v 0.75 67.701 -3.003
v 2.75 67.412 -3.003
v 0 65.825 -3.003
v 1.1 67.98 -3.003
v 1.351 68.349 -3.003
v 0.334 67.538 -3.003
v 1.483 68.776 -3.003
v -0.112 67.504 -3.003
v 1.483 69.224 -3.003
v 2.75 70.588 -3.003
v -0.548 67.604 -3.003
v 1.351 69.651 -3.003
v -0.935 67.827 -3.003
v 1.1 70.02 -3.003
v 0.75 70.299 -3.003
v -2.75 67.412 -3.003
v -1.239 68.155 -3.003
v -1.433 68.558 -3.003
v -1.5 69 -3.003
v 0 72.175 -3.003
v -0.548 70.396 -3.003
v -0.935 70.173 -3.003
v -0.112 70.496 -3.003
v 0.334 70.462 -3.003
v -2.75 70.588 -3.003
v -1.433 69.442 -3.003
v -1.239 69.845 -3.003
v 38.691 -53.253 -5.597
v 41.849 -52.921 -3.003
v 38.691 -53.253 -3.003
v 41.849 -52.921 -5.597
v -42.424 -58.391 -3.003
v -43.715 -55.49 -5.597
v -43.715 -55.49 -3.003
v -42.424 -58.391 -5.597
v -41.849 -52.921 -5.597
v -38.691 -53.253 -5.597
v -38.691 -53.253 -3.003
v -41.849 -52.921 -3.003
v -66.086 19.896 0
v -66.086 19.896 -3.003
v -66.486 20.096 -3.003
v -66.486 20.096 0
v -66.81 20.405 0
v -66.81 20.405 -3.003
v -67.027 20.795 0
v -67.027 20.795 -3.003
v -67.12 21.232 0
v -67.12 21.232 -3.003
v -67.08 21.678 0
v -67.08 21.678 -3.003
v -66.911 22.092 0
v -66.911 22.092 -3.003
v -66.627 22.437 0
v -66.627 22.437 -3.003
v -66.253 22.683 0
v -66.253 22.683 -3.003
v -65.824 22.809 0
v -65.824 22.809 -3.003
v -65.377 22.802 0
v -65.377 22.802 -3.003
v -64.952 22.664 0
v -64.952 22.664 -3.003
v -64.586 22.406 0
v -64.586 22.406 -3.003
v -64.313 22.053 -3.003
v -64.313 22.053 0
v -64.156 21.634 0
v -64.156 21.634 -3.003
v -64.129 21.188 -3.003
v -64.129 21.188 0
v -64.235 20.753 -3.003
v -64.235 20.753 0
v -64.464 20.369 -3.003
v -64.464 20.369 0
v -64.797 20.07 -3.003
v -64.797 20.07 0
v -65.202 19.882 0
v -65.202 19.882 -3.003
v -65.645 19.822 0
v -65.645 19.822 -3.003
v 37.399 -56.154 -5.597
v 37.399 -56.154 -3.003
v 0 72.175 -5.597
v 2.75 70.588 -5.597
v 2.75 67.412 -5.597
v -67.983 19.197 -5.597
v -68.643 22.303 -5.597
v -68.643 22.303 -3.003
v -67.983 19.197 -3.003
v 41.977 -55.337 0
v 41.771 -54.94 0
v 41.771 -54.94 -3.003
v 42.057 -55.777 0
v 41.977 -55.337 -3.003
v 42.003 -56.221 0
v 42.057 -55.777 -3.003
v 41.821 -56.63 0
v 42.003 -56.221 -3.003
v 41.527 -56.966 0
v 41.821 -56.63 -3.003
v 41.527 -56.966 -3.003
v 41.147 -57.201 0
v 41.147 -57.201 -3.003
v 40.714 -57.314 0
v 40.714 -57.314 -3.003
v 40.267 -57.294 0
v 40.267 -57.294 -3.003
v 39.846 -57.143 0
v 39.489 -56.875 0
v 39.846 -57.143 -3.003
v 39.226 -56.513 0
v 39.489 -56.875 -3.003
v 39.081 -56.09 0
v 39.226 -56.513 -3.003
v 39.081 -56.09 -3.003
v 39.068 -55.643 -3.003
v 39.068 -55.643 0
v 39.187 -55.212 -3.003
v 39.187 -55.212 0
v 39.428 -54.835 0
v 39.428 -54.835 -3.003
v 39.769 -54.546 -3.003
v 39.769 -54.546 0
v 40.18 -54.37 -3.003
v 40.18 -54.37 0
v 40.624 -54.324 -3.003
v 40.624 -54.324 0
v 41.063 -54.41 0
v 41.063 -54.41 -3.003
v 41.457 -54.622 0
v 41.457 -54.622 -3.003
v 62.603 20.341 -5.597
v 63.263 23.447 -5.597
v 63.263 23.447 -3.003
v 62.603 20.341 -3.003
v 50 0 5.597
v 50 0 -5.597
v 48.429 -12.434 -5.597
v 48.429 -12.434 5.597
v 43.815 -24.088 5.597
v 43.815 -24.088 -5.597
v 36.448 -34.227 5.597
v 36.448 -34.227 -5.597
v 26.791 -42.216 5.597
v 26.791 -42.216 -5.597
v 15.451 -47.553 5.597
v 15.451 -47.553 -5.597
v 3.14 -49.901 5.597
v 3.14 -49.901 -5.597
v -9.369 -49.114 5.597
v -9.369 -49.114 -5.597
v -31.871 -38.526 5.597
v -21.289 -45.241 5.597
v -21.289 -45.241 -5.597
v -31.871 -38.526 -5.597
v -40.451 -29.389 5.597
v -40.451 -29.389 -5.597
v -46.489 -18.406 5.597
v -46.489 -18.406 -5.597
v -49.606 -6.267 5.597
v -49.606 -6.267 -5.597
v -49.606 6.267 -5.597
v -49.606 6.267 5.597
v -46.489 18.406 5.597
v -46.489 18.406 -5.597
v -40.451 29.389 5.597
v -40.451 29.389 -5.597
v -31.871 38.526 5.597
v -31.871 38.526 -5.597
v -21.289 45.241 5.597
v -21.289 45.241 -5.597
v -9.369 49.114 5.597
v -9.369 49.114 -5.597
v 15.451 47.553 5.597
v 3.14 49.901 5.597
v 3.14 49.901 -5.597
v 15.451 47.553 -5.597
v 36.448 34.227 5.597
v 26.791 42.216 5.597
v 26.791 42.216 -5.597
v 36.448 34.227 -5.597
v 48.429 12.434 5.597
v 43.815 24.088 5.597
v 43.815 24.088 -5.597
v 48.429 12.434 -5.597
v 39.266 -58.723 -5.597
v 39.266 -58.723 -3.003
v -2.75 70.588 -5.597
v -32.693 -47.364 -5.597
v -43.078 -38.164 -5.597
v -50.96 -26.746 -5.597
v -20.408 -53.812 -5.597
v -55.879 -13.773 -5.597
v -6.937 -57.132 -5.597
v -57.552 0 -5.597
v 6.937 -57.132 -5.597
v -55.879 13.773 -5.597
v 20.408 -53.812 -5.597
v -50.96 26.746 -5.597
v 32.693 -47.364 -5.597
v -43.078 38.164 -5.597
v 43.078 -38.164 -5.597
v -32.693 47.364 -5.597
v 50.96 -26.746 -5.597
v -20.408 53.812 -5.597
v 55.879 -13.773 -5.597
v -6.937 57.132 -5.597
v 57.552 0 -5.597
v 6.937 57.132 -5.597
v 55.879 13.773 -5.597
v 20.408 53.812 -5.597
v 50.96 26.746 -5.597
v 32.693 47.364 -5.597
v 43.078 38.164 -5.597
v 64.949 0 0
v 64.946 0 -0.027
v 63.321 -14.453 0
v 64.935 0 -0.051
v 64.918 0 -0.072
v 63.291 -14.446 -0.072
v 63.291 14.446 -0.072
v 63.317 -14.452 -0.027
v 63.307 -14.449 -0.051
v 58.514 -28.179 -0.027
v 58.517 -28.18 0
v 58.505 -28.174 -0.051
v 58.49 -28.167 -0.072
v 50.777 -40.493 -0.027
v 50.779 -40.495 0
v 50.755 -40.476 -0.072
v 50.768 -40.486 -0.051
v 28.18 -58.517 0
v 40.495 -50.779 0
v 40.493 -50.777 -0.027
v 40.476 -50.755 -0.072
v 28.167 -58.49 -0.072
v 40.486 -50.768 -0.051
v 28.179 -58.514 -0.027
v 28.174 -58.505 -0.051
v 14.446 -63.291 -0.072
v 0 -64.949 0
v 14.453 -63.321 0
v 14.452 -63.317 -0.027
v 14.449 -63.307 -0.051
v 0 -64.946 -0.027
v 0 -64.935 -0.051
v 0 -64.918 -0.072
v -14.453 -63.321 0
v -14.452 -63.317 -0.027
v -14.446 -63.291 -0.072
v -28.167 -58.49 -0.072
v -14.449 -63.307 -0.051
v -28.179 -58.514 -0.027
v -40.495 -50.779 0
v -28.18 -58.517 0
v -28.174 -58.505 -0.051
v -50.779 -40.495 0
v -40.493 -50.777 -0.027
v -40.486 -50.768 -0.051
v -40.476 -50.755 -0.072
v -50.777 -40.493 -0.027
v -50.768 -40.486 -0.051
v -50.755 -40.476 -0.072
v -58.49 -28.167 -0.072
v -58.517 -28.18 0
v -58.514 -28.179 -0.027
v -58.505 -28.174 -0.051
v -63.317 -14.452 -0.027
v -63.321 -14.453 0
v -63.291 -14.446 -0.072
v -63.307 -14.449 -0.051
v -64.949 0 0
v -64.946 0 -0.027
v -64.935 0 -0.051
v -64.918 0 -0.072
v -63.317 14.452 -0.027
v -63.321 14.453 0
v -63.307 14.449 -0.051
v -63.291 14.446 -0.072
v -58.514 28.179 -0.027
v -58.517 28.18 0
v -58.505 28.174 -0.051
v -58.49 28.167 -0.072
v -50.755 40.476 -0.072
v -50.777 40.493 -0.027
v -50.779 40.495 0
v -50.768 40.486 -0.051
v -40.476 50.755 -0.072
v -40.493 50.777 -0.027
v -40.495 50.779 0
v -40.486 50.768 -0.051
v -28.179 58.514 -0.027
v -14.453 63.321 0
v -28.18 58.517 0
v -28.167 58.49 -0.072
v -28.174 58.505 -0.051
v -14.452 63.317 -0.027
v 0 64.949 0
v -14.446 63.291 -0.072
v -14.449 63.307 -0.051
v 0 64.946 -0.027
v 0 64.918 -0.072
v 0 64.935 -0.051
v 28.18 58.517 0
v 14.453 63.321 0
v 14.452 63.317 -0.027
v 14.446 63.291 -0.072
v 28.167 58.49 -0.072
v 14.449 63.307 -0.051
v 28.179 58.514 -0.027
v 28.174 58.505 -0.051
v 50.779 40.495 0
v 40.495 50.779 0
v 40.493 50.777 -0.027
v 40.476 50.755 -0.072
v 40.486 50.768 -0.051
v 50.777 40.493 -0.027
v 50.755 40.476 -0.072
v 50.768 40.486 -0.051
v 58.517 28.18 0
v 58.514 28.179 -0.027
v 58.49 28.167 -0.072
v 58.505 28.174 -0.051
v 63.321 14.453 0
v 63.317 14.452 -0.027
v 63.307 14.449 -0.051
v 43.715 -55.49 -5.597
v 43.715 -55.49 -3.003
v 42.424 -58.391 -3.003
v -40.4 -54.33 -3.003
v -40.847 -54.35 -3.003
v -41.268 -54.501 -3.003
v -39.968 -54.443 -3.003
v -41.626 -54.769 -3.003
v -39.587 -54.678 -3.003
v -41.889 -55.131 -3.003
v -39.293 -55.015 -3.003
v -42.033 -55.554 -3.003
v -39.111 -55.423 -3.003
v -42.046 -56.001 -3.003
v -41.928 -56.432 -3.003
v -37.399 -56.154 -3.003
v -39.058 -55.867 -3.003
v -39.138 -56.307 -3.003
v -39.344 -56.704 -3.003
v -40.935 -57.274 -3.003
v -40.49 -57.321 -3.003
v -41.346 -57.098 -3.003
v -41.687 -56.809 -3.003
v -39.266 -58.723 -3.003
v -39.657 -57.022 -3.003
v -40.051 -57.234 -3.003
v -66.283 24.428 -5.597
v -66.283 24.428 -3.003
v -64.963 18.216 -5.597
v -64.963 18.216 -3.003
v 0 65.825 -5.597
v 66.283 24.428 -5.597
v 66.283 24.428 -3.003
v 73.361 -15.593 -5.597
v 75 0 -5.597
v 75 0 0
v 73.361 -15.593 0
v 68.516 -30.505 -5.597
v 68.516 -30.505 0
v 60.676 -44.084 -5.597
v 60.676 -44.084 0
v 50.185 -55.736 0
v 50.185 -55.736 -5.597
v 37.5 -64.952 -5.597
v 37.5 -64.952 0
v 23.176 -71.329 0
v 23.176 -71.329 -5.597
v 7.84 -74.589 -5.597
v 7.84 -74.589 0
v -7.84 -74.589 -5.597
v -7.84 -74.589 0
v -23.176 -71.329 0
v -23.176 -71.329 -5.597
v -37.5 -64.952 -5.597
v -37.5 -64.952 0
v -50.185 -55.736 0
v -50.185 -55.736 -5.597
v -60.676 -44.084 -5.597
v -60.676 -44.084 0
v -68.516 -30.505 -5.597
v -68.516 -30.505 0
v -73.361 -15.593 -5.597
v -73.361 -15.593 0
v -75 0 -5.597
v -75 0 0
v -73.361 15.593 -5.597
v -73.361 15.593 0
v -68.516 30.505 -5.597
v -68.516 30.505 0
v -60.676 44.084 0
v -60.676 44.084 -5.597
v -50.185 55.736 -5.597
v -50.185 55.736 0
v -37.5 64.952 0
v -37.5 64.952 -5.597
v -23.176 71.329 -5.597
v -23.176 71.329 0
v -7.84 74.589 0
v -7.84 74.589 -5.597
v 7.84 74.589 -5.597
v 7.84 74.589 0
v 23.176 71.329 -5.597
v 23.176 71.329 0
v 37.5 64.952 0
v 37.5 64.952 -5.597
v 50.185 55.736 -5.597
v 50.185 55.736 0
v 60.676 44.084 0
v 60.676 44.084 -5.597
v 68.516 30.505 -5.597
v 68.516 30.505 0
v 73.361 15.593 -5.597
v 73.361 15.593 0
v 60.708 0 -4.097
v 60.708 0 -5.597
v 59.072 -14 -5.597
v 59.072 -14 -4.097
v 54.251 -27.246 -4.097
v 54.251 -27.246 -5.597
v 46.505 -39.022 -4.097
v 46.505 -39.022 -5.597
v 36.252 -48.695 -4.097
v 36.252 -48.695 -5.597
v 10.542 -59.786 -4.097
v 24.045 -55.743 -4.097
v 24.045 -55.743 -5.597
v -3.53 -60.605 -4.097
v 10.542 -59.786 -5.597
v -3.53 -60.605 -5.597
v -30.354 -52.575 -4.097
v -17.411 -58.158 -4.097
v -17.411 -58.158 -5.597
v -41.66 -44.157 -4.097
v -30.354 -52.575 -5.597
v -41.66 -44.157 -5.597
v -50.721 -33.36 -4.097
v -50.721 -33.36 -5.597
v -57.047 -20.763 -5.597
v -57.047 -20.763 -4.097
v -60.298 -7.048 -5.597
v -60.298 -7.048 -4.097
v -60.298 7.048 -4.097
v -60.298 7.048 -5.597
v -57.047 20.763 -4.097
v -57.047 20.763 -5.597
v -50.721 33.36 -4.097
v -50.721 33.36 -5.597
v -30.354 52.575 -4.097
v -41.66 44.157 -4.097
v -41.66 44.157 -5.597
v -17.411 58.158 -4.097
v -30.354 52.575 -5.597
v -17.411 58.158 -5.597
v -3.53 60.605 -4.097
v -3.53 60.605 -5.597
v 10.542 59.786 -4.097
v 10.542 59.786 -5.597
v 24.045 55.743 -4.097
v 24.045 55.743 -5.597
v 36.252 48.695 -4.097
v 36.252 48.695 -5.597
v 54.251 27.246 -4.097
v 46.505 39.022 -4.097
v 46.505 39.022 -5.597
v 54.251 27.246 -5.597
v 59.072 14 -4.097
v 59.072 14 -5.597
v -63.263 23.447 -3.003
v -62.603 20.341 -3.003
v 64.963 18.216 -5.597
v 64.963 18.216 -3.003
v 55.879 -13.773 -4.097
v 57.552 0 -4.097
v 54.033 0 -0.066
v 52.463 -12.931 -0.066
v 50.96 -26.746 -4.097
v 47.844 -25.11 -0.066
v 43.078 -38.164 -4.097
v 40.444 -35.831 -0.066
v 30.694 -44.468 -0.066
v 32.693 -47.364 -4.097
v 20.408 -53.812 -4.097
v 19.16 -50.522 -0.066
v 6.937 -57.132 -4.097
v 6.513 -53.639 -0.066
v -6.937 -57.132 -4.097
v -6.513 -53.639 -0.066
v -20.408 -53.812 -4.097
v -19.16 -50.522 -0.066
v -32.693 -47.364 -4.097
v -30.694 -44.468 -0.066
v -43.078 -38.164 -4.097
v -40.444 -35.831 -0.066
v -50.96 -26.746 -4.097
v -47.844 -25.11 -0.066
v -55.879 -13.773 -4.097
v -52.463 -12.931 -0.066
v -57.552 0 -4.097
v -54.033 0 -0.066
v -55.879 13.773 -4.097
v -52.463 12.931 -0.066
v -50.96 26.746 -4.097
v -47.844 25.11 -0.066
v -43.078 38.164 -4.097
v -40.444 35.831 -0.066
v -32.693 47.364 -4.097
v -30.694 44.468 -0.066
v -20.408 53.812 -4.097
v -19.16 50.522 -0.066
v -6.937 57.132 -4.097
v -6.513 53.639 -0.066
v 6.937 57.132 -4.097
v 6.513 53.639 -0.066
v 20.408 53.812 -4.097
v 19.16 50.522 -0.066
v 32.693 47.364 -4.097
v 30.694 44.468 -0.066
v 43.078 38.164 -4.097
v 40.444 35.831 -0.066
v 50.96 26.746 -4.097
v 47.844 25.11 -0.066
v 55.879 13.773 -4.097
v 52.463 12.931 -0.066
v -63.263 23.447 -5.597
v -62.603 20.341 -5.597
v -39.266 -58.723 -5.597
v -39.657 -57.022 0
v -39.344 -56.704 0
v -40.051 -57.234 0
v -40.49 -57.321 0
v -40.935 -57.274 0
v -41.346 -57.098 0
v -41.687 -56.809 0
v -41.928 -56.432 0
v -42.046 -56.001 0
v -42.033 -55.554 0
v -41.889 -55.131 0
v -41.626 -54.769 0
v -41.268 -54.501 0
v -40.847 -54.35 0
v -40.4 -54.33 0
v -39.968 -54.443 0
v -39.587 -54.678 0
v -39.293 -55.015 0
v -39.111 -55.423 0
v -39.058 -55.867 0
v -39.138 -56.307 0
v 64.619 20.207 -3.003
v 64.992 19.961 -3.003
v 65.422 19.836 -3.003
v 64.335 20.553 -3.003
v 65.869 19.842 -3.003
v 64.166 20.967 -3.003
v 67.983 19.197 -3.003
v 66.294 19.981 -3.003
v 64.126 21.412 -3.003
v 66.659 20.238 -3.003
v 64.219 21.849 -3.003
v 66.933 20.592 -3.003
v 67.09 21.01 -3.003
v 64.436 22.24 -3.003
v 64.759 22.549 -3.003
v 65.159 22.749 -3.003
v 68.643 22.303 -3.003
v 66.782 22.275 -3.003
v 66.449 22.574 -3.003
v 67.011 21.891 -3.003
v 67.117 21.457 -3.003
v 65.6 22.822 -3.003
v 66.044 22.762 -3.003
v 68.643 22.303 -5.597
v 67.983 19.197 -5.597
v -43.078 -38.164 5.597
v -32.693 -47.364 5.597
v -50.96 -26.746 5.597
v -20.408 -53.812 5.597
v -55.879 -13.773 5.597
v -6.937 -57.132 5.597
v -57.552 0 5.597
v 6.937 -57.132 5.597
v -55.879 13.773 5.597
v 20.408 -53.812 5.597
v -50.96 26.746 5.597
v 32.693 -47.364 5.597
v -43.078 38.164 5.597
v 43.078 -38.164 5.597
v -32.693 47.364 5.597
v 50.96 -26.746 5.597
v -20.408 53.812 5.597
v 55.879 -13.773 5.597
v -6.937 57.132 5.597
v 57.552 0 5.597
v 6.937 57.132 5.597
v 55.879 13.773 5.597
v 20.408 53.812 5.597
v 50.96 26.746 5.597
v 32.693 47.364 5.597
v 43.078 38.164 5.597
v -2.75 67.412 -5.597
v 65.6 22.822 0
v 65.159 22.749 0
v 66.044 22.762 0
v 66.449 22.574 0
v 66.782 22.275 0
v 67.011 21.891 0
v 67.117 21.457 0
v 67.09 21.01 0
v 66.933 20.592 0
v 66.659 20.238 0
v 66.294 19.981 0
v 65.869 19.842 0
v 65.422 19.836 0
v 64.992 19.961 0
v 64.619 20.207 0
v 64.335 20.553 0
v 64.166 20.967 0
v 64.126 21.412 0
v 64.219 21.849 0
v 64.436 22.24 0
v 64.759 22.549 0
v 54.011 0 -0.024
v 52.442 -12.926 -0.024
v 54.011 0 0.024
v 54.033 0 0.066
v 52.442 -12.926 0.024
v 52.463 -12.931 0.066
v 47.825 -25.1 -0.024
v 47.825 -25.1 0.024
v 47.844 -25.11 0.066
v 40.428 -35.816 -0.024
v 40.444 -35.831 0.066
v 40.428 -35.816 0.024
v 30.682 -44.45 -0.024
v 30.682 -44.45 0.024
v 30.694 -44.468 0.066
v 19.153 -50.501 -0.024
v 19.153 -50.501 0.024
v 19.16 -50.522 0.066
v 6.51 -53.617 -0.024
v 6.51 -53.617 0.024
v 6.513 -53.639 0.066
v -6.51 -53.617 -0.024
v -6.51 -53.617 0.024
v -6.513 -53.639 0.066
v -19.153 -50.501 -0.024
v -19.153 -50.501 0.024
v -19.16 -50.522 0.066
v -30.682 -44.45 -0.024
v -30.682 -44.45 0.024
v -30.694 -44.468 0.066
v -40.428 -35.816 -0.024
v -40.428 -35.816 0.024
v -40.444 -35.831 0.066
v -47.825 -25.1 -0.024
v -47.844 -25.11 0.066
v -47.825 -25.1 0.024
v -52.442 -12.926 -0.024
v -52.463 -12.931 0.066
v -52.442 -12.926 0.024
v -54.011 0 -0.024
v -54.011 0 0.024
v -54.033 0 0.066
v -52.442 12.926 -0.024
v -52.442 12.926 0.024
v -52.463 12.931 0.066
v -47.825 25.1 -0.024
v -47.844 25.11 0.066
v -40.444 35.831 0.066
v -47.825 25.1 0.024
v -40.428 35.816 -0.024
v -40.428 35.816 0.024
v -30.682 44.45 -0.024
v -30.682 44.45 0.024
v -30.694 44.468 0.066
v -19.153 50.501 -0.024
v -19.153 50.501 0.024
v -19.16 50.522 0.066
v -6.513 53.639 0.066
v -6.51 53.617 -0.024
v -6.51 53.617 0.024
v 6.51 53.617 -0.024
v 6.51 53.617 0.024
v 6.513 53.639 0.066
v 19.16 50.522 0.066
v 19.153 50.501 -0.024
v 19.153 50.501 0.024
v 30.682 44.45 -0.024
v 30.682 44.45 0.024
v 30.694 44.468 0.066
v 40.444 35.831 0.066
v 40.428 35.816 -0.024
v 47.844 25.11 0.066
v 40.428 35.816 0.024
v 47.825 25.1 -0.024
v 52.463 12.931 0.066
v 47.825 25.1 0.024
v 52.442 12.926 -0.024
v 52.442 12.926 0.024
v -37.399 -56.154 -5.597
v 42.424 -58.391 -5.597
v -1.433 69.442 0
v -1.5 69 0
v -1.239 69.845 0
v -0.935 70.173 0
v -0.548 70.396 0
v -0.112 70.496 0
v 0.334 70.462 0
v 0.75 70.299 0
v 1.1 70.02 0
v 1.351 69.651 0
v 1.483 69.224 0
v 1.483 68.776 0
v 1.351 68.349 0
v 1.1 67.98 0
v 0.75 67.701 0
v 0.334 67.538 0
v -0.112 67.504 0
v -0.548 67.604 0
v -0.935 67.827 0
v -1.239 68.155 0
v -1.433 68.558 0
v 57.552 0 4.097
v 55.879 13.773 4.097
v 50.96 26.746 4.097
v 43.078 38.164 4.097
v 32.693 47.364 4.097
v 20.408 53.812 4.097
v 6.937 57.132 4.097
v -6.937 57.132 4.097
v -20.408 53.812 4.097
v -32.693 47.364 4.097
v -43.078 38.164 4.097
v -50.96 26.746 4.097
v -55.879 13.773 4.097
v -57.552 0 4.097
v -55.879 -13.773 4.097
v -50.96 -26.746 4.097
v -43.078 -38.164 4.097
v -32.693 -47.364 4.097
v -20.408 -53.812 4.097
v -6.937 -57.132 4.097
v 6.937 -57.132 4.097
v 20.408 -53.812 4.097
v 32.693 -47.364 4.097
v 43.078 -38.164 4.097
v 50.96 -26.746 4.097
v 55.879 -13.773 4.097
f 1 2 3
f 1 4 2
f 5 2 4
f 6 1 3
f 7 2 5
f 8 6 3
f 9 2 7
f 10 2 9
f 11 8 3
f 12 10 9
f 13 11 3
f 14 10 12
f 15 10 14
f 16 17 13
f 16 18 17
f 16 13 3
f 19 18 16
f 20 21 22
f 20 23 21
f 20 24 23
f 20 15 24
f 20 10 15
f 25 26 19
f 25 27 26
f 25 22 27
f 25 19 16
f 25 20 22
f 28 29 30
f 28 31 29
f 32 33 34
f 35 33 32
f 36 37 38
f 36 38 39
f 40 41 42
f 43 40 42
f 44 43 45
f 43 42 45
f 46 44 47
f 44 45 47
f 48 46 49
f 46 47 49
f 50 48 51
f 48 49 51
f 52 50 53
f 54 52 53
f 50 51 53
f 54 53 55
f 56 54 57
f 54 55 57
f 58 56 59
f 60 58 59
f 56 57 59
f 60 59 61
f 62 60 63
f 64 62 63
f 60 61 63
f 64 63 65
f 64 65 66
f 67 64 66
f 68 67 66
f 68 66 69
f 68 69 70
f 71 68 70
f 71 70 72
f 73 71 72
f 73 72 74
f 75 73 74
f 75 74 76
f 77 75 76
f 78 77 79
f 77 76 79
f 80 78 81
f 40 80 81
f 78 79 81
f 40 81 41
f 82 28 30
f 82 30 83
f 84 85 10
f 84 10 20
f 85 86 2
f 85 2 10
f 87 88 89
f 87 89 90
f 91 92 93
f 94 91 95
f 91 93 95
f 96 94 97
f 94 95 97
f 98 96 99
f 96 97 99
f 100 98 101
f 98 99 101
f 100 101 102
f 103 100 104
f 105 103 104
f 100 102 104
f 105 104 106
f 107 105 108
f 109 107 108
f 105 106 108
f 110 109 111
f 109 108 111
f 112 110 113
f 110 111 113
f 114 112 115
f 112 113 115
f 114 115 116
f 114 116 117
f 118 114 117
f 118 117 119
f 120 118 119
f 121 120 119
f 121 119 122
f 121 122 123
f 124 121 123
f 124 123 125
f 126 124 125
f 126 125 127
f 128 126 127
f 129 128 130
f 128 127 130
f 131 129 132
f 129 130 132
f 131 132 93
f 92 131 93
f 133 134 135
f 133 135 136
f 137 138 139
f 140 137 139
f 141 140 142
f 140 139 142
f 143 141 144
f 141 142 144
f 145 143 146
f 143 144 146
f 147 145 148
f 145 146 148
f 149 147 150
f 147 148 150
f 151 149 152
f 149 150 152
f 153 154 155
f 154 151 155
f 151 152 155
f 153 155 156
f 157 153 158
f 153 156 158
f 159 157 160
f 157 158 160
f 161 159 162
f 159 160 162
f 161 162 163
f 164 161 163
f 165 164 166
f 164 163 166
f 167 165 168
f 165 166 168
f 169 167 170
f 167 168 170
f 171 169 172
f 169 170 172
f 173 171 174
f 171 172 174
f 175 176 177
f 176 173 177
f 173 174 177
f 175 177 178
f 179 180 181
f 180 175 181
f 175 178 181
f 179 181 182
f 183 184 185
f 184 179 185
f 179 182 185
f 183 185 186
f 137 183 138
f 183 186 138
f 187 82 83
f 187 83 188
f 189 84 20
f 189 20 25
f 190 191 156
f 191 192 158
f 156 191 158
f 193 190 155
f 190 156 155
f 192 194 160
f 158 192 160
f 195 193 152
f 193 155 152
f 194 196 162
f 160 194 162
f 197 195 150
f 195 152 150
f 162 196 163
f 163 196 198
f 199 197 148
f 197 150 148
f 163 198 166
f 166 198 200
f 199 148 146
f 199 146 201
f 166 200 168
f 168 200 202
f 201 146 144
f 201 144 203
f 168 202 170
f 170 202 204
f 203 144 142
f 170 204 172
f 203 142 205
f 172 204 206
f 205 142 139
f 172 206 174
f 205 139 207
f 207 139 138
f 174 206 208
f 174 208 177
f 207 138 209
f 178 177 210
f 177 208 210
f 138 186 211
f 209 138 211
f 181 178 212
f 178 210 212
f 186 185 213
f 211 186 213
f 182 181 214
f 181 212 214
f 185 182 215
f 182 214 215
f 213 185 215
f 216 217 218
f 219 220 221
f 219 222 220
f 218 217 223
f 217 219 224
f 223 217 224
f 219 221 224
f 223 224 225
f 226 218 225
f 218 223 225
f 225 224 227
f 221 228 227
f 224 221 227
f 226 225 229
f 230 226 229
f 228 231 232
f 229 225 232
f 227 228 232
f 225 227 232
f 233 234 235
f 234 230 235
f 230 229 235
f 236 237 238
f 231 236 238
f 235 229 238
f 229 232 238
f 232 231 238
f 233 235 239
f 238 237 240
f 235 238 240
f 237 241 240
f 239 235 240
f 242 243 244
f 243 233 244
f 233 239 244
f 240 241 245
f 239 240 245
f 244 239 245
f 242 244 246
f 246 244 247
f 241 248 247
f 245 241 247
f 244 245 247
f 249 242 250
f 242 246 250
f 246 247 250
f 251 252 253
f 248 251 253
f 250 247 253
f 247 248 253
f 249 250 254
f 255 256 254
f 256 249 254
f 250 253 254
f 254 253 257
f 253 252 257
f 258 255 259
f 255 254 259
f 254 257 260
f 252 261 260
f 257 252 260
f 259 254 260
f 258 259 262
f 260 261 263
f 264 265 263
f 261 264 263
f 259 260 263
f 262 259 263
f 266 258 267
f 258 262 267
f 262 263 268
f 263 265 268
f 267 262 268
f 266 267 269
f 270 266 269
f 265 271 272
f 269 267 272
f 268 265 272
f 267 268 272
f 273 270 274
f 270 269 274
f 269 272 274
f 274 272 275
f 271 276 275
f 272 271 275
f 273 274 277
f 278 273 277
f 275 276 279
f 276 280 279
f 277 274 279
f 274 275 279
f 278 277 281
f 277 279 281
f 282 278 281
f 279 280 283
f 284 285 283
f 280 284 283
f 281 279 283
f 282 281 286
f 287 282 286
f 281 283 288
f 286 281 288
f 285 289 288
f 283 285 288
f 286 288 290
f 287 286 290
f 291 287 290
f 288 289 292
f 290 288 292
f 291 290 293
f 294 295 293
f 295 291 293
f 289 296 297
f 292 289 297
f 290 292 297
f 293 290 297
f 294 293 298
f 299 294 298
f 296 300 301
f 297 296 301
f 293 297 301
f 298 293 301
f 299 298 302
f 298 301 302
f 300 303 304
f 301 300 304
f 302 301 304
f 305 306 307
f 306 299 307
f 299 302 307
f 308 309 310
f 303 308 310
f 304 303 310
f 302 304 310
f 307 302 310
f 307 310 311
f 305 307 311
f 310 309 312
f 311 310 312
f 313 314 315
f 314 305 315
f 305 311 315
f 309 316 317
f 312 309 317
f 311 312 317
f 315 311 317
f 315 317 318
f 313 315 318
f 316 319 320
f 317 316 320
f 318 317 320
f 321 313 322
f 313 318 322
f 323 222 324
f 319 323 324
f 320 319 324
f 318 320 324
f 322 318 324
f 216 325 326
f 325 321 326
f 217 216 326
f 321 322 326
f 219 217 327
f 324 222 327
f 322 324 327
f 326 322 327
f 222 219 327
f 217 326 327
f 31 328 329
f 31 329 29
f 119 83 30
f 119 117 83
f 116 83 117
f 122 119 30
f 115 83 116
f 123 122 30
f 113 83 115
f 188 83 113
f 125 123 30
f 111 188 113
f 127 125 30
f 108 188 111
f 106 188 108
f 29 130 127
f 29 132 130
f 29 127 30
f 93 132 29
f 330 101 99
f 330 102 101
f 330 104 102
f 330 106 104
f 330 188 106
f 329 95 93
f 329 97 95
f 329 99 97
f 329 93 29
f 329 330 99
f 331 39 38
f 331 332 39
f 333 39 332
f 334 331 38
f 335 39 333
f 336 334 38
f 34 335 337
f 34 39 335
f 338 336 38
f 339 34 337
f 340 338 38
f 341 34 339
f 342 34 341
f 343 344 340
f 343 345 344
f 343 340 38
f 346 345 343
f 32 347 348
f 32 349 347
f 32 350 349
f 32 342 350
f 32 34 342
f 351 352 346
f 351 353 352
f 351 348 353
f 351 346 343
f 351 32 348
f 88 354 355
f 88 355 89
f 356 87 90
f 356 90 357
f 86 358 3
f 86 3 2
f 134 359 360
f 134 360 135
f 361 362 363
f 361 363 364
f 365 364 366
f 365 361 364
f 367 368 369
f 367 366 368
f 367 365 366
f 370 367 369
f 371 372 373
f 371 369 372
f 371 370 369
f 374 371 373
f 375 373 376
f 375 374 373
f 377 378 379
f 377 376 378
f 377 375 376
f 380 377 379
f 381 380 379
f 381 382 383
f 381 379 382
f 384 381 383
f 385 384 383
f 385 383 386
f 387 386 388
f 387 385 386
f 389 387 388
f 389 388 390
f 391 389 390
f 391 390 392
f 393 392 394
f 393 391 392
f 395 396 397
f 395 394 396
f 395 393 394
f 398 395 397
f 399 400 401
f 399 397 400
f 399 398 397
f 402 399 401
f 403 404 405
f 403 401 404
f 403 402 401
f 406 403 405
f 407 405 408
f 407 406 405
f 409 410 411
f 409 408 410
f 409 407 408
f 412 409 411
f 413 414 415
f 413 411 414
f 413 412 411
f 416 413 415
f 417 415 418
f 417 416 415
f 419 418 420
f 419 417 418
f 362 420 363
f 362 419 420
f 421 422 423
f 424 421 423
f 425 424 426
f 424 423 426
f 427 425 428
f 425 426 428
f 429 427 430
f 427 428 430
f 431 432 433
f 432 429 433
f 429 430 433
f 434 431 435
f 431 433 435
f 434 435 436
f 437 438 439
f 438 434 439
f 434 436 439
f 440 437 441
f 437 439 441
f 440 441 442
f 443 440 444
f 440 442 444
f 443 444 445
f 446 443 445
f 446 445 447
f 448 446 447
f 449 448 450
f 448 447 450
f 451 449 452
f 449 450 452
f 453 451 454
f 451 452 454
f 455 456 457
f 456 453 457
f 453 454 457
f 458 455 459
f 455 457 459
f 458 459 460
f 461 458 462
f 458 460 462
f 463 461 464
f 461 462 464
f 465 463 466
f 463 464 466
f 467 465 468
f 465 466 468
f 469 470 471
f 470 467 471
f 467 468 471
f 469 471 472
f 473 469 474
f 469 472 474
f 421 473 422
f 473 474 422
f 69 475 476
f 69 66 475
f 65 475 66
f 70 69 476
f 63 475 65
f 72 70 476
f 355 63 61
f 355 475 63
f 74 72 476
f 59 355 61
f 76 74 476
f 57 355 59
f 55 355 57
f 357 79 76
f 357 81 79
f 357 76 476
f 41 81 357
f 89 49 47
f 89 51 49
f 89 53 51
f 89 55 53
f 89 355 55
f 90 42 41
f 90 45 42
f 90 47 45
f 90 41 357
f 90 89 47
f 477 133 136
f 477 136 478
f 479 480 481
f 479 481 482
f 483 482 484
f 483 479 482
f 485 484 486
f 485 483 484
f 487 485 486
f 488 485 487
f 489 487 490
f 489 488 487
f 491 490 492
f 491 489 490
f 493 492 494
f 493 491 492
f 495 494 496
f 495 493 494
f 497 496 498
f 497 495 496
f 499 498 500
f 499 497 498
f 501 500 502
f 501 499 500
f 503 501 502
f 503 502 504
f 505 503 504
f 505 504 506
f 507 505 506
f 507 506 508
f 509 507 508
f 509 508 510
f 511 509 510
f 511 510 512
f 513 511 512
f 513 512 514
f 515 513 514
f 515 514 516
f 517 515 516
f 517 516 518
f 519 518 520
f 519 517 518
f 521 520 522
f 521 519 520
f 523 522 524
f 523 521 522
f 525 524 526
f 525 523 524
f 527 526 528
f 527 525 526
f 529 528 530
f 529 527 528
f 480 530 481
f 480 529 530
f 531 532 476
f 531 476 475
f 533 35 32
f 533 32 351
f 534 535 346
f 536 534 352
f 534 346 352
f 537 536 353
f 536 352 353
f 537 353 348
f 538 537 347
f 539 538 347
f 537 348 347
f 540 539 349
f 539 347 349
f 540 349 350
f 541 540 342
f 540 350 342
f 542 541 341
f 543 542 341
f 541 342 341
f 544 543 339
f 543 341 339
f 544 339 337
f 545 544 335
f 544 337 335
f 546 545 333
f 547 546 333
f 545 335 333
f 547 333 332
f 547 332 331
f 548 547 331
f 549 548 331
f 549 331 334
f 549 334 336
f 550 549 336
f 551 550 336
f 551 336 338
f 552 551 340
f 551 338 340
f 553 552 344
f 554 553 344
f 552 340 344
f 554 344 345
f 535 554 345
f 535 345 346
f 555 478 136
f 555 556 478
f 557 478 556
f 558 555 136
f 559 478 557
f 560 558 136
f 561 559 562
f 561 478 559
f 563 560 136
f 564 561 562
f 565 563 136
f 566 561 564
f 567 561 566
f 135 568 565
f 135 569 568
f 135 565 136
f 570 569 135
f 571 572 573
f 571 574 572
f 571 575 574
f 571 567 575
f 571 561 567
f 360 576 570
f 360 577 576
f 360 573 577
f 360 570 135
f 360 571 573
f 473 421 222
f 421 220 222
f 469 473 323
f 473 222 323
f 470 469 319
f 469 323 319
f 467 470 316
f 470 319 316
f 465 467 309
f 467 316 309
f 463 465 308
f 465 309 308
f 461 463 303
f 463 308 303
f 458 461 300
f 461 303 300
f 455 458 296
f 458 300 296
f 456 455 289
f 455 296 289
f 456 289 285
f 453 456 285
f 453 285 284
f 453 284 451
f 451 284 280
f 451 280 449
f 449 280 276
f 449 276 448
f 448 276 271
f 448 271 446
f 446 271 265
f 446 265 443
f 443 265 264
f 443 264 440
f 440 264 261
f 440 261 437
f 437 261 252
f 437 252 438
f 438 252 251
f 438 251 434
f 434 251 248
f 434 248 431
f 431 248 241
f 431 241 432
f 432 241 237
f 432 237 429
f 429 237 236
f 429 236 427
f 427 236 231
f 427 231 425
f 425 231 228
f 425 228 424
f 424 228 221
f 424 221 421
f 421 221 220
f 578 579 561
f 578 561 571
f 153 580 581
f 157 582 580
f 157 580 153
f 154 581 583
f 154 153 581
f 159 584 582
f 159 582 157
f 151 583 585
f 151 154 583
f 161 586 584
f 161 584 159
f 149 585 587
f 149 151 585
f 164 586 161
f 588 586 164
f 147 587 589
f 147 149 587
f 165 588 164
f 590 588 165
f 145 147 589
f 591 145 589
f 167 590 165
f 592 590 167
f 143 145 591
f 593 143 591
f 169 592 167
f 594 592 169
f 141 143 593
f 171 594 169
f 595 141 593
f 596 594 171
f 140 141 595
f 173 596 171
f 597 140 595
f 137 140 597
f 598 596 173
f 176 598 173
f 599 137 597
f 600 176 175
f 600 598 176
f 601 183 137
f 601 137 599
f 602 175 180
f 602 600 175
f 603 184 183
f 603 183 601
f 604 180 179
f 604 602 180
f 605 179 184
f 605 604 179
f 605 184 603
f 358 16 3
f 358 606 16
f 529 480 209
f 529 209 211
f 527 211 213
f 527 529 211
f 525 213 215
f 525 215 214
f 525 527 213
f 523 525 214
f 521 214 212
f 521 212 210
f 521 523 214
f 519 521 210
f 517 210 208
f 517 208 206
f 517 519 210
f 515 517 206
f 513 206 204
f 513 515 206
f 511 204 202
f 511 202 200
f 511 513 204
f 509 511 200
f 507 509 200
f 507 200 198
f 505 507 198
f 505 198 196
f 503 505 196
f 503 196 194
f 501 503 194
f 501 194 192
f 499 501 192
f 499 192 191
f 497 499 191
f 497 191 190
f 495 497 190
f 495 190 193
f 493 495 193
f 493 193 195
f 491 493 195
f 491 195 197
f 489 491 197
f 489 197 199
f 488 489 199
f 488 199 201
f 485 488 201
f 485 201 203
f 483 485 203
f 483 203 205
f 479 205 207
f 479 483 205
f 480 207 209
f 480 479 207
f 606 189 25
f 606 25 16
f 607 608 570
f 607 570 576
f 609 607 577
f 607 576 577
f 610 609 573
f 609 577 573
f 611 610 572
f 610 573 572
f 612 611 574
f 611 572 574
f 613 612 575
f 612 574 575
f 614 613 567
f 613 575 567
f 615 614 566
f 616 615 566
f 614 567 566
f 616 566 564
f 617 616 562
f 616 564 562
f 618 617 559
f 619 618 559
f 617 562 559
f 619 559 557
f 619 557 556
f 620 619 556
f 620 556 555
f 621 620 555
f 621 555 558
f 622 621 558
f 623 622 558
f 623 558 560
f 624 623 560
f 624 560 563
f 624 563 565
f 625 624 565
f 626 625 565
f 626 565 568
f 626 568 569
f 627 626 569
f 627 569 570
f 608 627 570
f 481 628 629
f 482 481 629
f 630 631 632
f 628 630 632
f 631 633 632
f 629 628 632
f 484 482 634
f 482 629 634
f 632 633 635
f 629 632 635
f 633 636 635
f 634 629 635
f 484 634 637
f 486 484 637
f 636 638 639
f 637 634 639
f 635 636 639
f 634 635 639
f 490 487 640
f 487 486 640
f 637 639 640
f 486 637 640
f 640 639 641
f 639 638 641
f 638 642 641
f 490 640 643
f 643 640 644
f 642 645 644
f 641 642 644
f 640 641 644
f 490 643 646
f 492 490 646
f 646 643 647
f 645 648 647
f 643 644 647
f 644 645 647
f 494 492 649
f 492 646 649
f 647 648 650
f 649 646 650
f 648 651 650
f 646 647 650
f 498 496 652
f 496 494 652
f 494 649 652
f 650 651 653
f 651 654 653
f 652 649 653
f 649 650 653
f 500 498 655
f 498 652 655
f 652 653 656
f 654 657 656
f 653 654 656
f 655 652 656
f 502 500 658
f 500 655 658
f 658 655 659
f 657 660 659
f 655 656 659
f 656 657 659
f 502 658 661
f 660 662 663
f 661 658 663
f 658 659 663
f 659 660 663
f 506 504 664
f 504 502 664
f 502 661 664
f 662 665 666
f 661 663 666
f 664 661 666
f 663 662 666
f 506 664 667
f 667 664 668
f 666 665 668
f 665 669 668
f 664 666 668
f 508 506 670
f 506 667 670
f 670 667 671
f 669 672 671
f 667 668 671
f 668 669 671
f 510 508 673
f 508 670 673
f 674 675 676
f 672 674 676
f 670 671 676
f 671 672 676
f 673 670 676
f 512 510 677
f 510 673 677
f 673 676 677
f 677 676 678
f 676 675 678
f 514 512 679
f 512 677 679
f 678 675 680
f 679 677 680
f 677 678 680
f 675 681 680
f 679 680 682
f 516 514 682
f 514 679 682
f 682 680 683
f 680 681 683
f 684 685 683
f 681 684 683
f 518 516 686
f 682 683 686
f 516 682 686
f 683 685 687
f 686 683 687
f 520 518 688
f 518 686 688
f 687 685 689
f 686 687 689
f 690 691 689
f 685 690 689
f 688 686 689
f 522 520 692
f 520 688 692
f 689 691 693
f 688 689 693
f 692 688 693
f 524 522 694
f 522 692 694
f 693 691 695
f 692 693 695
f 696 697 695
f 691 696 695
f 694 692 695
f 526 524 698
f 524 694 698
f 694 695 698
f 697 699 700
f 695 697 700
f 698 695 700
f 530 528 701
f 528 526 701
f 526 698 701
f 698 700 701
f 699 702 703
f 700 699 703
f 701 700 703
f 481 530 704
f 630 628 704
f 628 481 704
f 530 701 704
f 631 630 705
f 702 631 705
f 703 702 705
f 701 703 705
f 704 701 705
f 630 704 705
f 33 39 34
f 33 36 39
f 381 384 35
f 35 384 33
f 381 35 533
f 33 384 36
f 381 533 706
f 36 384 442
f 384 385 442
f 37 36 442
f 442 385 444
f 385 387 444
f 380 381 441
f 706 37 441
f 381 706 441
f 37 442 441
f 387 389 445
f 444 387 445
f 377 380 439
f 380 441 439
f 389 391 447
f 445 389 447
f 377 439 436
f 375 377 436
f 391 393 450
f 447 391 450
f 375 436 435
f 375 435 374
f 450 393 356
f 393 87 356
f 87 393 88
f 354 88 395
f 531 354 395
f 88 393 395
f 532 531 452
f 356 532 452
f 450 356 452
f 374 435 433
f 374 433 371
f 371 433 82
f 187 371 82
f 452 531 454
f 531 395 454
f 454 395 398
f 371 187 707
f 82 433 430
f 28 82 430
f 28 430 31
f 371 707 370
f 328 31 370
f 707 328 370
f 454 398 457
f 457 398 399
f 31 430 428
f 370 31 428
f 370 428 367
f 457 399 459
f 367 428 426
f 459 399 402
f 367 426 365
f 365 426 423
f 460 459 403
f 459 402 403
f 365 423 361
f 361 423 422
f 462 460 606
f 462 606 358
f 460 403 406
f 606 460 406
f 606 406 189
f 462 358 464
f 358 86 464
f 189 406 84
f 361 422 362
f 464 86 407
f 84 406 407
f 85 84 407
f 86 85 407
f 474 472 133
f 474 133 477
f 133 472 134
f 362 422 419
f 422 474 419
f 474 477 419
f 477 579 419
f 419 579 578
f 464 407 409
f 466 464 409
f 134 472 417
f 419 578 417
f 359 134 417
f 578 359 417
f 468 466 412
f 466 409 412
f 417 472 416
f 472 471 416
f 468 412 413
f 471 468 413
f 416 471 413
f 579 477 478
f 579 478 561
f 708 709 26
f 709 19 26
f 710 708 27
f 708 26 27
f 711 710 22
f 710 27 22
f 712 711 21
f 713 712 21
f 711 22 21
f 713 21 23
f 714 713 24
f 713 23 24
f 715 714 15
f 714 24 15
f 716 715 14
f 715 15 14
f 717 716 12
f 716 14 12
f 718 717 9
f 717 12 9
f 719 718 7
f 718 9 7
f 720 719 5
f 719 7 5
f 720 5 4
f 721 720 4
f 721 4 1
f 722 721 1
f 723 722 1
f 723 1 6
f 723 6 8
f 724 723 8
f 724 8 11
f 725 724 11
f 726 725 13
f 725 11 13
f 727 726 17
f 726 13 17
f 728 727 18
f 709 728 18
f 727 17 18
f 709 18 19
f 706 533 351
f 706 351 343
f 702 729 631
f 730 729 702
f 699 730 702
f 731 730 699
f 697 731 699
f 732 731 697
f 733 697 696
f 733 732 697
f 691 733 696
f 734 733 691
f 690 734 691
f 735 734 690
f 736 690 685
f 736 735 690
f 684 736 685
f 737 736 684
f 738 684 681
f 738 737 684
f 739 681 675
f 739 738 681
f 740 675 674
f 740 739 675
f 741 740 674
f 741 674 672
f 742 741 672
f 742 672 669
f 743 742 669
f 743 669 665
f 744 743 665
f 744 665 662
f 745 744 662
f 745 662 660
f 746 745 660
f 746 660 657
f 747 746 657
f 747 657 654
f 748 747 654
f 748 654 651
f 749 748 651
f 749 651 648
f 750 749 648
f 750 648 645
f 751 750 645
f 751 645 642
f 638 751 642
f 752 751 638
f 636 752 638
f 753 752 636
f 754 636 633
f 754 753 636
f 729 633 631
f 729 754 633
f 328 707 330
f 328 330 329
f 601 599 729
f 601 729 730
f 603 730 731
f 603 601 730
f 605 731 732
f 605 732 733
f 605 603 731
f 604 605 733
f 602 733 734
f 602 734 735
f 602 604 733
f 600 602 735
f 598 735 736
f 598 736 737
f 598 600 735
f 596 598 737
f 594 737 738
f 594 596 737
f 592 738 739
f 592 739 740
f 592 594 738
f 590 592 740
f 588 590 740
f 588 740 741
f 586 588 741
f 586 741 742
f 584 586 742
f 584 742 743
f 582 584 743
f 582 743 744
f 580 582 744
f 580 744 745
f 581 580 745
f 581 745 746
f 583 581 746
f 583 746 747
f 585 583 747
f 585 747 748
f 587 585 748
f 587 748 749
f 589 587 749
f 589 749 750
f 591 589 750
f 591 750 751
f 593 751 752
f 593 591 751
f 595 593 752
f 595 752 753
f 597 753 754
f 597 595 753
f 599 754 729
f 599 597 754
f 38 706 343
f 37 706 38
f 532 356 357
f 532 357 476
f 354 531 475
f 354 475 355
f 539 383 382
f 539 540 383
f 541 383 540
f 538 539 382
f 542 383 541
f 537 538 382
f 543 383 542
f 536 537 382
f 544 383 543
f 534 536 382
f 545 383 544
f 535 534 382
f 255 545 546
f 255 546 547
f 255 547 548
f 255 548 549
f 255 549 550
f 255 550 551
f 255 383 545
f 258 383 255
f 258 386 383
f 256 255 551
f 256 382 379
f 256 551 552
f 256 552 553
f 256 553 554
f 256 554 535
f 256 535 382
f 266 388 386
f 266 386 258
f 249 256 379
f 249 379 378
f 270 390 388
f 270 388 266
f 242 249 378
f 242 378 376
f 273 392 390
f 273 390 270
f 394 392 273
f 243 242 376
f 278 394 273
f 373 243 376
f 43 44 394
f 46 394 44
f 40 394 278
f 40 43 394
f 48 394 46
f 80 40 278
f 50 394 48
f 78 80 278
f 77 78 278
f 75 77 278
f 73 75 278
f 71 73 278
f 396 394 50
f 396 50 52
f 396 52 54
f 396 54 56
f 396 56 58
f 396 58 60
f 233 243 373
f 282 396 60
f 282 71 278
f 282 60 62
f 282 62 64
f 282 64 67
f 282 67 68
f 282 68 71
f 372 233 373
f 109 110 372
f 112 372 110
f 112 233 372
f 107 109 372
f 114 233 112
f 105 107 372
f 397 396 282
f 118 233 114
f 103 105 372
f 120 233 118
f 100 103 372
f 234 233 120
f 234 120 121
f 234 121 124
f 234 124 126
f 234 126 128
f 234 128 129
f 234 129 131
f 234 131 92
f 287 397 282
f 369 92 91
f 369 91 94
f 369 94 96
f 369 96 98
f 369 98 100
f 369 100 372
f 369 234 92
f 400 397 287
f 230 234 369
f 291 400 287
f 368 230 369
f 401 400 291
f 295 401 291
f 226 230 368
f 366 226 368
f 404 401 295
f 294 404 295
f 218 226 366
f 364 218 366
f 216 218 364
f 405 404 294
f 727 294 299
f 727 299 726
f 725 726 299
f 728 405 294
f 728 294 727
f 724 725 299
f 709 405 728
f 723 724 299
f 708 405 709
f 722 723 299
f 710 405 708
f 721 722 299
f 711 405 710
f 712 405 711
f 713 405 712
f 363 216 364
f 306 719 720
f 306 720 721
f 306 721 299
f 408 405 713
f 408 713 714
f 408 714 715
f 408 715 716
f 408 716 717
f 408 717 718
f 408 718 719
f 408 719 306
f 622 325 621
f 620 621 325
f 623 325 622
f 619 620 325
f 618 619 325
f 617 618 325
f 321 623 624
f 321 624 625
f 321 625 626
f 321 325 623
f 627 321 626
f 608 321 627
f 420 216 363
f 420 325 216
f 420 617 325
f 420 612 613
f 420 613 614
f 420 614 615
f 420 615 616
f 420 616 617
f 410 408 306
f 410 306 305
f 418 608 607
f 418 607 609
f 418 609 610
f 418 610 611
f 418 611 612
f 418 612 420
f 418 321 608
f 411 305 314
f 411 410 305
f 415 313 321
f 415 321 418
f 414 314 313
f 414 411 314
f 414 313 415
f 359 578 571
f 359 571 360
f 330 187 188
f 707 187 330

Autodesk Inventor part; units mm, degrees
ref_plane "YZ Plane" through (0, 0, 0) normal (1, 0, 0) x (0, 1, 0)
ref_plane "XZ Plane" through (0, 0, 0) normal (0, 1, 0) x (-1, 0, 0)
sketch "Sketch7" plane through (0, 0, 0) normal (0, 1, 0) x (-1, 0, 0)
  line L0 (0, 0) -> (0, 61.9844)
  line L1 (0, 0) -> (-59.2469, 0) construction
  line L2 (0, 61.9844) -> (-59.2469, 0) construction
  line L3 (0, 61.9844) -> (-64.8494, 0) construction
  line L4 (0, 61.9844) -> (-58.9939, -5.5968) construction
  line L5 (0, 0) -> (0, -61.9844)
  line L6 (0, -61.9844) -> (-59.2469, 0) construction
  line L7 (0, -61.9844) -> (-64.8494, 0) construction
  line L8 (0, -61.9844) -> (-58.9939, 5.5968) construction
  line L9 (-58.9939, 5.5968) -> (-64.8494, 0) construction
  line L10 (-54.1083, 0) -> (-62.8579, -8.363) construction
  line L11 (-54.1083, 0) -> (-38.773, -14.6578) construction
  line L12 (0, -94.3812) -> (0, 132.3969) projected
  line L13 (-75, -5.9919) -> (-75, 6.008)
  line L14 (105, 0) -> (-105, 0) projected
  line L15 (-62.0481, 2.6775) -> (-56.4456, -2.6775) construction
  line L16 (-56.4456, 2.6775) -> (-62.0481, -2.6775) construction
  line L17 (-26.151, -15.9303) -> (-40.3783, -15.9303) construction
  line L18 (-40.3783, -15.9303) -> (-40.3783, -12.7539) construction
  line L19 (-40.3783, -12.7539) -> (-26.151, -12.7539) construction
  line L20 (-26.151, -12.7539) -> (-26.151, -15.9303) construction
  point P0 (-75, 0)
  dimension "Roller_Side_difference" = -0.0002
  dimension "d90" = 61.9844
  dimension "d201" = 75
  dimension "d343" = 92.587
  dimension "d344" = 92.588
  dimension "d367" = 8.1
sketch "Sketch1" plane through (0, 0, 0) normal (0, 0, 1) x (1, 0, 0)
  circle A0 centre (0, 0) radius 59.2469 construction
  line L0 (0, 0) -> (59.2469, 0)
  line L1 (0, 0) -> (59.2469, 4.025)
  line L2 (59.2469, 0) -> (59.2469, 4.025)
  circle A1 centre (0, 0) radius 75
  point P0 (56.8, 0)
  dimension "d56" = 59.2469
  dimension "d57" = 4.025
  dimension "d400" = 75
  dimension "d495" = 2.5
  dimension "d496" = 8
  dimension "d531" = 5.5
  dimension "d532" = 5.5
  dimension "d533" = 5.5
  dimension "d537" = 24.5
  dimension "d538" = 3
  dimension "d543" = 5.5
  dimension "d549" = 3
  dimension "d550" = 3
  dimension "d567" = 5.5
  dimension "d568" = 5.5
sketch "Roller1" plane through (0, 0, 0) normal (0, 1, 0) x (-1, 0, 0)
  line L0 (0, 61.9844) -> (-58.9939, -5.5968) construction
  line L1 (0, 61.9844) -> (-64.8494, 0) construction
  line L2 (-54.1083, 0) -> (-38.773, -14.6578) construction
  line L3 (0, -61.9844) -> (-64.8494, 0) construction
  line L4 (-54.0606, 0.0927) -> (-58.9462, -5.5041)
  line L5 (-58.9462, -5.5041) -> (-64.7589, 0.0519)
  line L6 (-64.7589, 0.0519) -> (-59.3884, 5.1851)
  line L7 (-59.3884, 5.1851) -> (-54.0606, 0.0927)
  line L8 (-56.0019, 1.9482) -> (-61.1299, -3.4168)
  line L9 (-61.8526, -2.7261) -> (-56.7246, 2.639)
  point P0 (0, 0)
  dimension "d345" = 0.025
  dimension "d346" = 0.025
  dimension "d347" = 0.1
  dimension "d348" = 0.1
  dimension "d349" = 272.588
  dimension "d350" = 272.587
  dimension "d617" = 0.9997
sketch "Roller2" plane through (0, 0, 0) normal (0, 1, 0) x (-1, 0, 0)
  line L0 (0, -61.9844) -> (-58.9939, 5.5968) construction
  line L1 (-54.1083, 0) -> (-62.8579, -8.363) construction
  line L2 (0, -61.9844) -> (-64.8494, 0) construction
  line L3 (0, 61.9844) -> (-64.8494, 0) construction
  line L4 (-58.9462, 5.5041) -> (-54.1923, 0.0581)
  line L5 (-54.1923, 0.0581) -> (-59.5331, -5.0468)
  line L6 (-59.5331, -5.0468) -> (-64.7589, -0.0519)
  line L7 (-64.7589, -0.0519) -> (-58.9462, 5.5041)
  line L8 (-61.8526, 2.7261) -> (-56.8627, -2.4944)
  line L9 (-61.1297, 3.417) -> (-56.1399, -1.8034)
  point P0 (0, 0)
  dimension "d351" = 0.025
  dimension "d352" = 0.025
  dimension "d354" = 0.1
  dimension "d355" = 92.587
  dimension "d356" = 92.588
  dimension "d370" = 0.1
  dimension "d371" = 1
sketch "Sketch22" plane through (0, 0, 0) normal (0, 1, 0) x (-1, 0, 0)
  line L0 (-31.756, 8.0215) -> (-17.5287, 8.0215) construction
  line L1 (-17.5287, 8.0215) -> (-17.5287, 4.8451) construction
  line L2 (-17.5287, 4.8451) -> (-31.756, 4.8451) construction
  line L3 (-31.756, 4.8451) -> (-31.756, 8.0215) construction
  point P0 (0, 0)
  dimension "Roller_Side_difference" = -0.0002
sketch "Sketch2" plane through (0, 0, 0) normal (0, 1, 0) x (-1, 0, 0)
  line L0 (0, 0) -> (0, 59.2469) construction
  line L1 (0, 0) -> (-59.2469, 0) projected
  line L2 (0, 0) -> (0, -59.2469)
  line L3 (0, -59.2469) -> (-59.2469, 0) construction
  line L4 (0, 59.2469) -> (-59.2469, 0) construction
  line L5 (-50.488, 53.5552) -> (0, 59.2469) construction
  line L6 (-29.7354, 7.189) -> (0, 59.2469) construction
  line L7 (-29.7354, 7.189) -> (0, -59.2469) construction
  line L8 (-48.8381, -26.254) -> (0, -59.2469) construction
  point P0 (-40.4258, 18.8211)
sketch "Sketch23" plane through (0, 0, 0) normal (0, 1, 0) x (-1, 0, 0)
  line L0 (0, -61.9844) -> (-58.9939, 5.5968) construction
  line L1 (0, -61.9844) -> (-64.8494, 0) construction
  line L2 (0, 61.9844) -> (-58.9939, -5.5968) construction
  line L3 (-58.9939, 5.5968) -> (-64.8494, 0) construction
  line L4 (0, 61.9844) -> (-64.8494, 0) construction
  line L5 (-58.9939, 5.5968) -> (-58.9939, -5.5968) construction
  line L6 (105, 0) -> (-105, 0) projected
  line L7 (-57.5518, 4.0968) -> (-54.033, 0.0658)
  line L8 (-54.033, -0.0658) -> (-57.5518, -4.0968)
  line L9 (-60.708, 4.0968) -> (-64.9185, 0.0723)
  line L10 (-64.9185, -0.0723) -> (-60.708, -4.0968)
  arc A0 (-64.9185, 0.0723) -> (-64.9185, -0.0723) centre (-64.8494, 0) ccw
  arc A1 (-54.033, -0.0658) -> (-54.033, 0.0658) centre (-54.1083, 0) ccw
  line L11 (-57.5518, 4.0968) -> (-57.5518, 5.5968)
  line L12 (-57.5518, 5.5968) -> (-50, 5.5968)
  line L13 (-50, 5.5968) -> (-50, -5.5968)
  line L14 (-50, -5.5968) -> (-57.5518, -5.5968)
  line L15 (-57.5518, -5.5968) -> (-57.5518, -4.0968)
  line L16 (-60.708, 4.0968) -> (-60.708, 5.5968)
  line L17 (-60.708, 5.5968) -> (-75, 5.5968)
  line L18 (-75, 5.5968) -> (-75, -5.5968)
  line L19 (-60.708, -4.0968) -> (-60.708, -5.5968)
  line L20 (-60.708, -5.5968) -> (-75, -5.5968)
  line L21 (-58.9939, 5.5968) -> (-58.9939, 5.5968)
  line L22 (-58.9939, -5.5968) -> (-58.9939, -5.5968)
  line L23 (0, -94.3812) -> (0, 132.3969) projected
  line L24 (-64.9941, 0) -> (-75, 0)
  point P0 (0, 0)
  point P1 (-53.9756, 0)
  point P2 (-64.9494, 0)
  point P3 (-75, 0)
  dimension "d378" = 90
  dimension "d379" = 0.1
  dimension "d380" = 0.1
  dimension "d381" = 0.1
  dimension "d382" = 0.1
  dimension "d383" = 0.1
  dimension "d384" = 11.1935
  dimension "d385" = 0
  dimension "d386" = 0
  dimension "d391" = 50
  dimension "d392" = 75
  dimension "d393" = 1.5
  dimension "d394" = 1.5
  dimension "d395" = 1.5
  dimension "d396" = 1.5
revolve "RevRoller1" [suppressed]
fillet "Fillet1" [suppressed]
sketch "Sketch40" plane through (0, 0, -5.231) normal (0, 0, -1) x (-1, 0, 0)
  circle A0 centre (53.5, 0) radius 2.75 projected
  circle A1 centre (0, 0) radius 53.5 projected
  point P0 (53.4293, 2.7491)
  point P1 (53.4293, -2.7491)
  dimension "d585" = 8
  dimension "d587" = 1.75
  dimension "d589" = 3
  dimension "d592" = 2
  dimension "d593" = 12
  dimension "d594" = 12
  dimension "d611" = 360
pattern_circular "Circular Pattern13" [suppressed]
feature "Move Body7" [suppressed]
revolve "Revolution13" [suppressed]
fillet "Fillet3" [suppressed]
pattern_circular "Circular Pattern14" [suppressed]
feature "Move Body6" [suppressed]
revolve "Revolution14" add sketch "Sketch23" angle 360 about axis through (0, 0, -10) along (0, 0, 1) contours A1 L7 L11 L12 L13 L6 | L6 L13 L14 L15 L8 A1
revolve "OuterRim_Top2" add sketch "Sketch23" angle 360 about axis through (0, 0, -10) along (0, 0, 1) contours L6 A0 L10 L19 L20 L18
revolve "OuterRim_Bottom2" [suppressed]
ref_plane "Work Plane7" through (0, 0, 100) normal (0, 0, 1) x (1, 0, 0)
sketch "Sketch47" plane through (0, 0, 100) normal (0, 0, 1) x (1, 0, 0)
  circle A0 centre (0, 0) radius 75 construction
  circle A1 centre (0, 0) radius 60.708 construction
  circle A2 centre (0, 0) radius 57.5518 construction
  circle A3 centre (0, 0) radius 50 construction
  circle A4 centre (0, 0) radius 69
  point P0 (0, 69)
  dimension "d620" = 69
sketch "Sketch48" plane through (0, 0, 5.5968) normal (0, 0, 1) x (1, 0, 0)
  circle A0 centre (0, 69) radius 2.75
  circle A1 centre (0, 69) radius 1.5
  circle A2 centre (0, 0) radius 69 construction
  dimension "d621" = 3
  dimension "d622" = 5.5
extrude "Extrusion39" [suppressed]
extrude "Extrusion40" [suppressed]
pattern_circular "Circular Pattern28" [suppressed]
sketch "Sketch49" plane through (0, 0, -5.5968) normal (0, 0, -1) x (-1, 0, 0)
  circle A0 centre (0, 0) radius 69 construction
  circle A1 centre (0, 69) radius 1.5
  line L0 (2.75, 67.4123) -> (0, 65.8246)
  line L1 (0, 65.8246) -> (-2.75, 67.4123)
  line L2 (-2.75, 67.4123) -> (-2.75, 70.5877)
  line L3 (-2.75, 70.5877) -> (0, 72.1754)
  line L4 (0, 72.1754) -> (2.75, 70.5877)
  line L5 (2.75, 70.5877) -> (2.75, 67.4123)
  dimension "d630" = 5.5
  dimension "d631" = 3
extrude "Extrusion41" cut sketch "Sketch49" against normal blind 5.5968 contours A1
extrude "Extrusion42" cut sketch "Sketch49" against normal blind 2.5935
pattern_circular "Circular Pattern29" count 5 over 360 about axis through (0, 0, -4.8468) along (0, 0, 1) of "Extrusion41", "Extrusion42"
equation "\"Roller_Side_difference\" = -0.000942deg"
equation "\"Cycloid_Top_Plate_Fasner_Inner\" = 61.25"
equation "\"Cycloid_Top_Plate_Fasner_Outer\" = 85.75"
equation "\"Roller_Hole_Radius\" = 1"
equation "\"Distance_To_Bearing\" = 85.74529"
equation "\"d514\" = 0.2"
properties part number "Top_revolOuterBearing_TBS"
